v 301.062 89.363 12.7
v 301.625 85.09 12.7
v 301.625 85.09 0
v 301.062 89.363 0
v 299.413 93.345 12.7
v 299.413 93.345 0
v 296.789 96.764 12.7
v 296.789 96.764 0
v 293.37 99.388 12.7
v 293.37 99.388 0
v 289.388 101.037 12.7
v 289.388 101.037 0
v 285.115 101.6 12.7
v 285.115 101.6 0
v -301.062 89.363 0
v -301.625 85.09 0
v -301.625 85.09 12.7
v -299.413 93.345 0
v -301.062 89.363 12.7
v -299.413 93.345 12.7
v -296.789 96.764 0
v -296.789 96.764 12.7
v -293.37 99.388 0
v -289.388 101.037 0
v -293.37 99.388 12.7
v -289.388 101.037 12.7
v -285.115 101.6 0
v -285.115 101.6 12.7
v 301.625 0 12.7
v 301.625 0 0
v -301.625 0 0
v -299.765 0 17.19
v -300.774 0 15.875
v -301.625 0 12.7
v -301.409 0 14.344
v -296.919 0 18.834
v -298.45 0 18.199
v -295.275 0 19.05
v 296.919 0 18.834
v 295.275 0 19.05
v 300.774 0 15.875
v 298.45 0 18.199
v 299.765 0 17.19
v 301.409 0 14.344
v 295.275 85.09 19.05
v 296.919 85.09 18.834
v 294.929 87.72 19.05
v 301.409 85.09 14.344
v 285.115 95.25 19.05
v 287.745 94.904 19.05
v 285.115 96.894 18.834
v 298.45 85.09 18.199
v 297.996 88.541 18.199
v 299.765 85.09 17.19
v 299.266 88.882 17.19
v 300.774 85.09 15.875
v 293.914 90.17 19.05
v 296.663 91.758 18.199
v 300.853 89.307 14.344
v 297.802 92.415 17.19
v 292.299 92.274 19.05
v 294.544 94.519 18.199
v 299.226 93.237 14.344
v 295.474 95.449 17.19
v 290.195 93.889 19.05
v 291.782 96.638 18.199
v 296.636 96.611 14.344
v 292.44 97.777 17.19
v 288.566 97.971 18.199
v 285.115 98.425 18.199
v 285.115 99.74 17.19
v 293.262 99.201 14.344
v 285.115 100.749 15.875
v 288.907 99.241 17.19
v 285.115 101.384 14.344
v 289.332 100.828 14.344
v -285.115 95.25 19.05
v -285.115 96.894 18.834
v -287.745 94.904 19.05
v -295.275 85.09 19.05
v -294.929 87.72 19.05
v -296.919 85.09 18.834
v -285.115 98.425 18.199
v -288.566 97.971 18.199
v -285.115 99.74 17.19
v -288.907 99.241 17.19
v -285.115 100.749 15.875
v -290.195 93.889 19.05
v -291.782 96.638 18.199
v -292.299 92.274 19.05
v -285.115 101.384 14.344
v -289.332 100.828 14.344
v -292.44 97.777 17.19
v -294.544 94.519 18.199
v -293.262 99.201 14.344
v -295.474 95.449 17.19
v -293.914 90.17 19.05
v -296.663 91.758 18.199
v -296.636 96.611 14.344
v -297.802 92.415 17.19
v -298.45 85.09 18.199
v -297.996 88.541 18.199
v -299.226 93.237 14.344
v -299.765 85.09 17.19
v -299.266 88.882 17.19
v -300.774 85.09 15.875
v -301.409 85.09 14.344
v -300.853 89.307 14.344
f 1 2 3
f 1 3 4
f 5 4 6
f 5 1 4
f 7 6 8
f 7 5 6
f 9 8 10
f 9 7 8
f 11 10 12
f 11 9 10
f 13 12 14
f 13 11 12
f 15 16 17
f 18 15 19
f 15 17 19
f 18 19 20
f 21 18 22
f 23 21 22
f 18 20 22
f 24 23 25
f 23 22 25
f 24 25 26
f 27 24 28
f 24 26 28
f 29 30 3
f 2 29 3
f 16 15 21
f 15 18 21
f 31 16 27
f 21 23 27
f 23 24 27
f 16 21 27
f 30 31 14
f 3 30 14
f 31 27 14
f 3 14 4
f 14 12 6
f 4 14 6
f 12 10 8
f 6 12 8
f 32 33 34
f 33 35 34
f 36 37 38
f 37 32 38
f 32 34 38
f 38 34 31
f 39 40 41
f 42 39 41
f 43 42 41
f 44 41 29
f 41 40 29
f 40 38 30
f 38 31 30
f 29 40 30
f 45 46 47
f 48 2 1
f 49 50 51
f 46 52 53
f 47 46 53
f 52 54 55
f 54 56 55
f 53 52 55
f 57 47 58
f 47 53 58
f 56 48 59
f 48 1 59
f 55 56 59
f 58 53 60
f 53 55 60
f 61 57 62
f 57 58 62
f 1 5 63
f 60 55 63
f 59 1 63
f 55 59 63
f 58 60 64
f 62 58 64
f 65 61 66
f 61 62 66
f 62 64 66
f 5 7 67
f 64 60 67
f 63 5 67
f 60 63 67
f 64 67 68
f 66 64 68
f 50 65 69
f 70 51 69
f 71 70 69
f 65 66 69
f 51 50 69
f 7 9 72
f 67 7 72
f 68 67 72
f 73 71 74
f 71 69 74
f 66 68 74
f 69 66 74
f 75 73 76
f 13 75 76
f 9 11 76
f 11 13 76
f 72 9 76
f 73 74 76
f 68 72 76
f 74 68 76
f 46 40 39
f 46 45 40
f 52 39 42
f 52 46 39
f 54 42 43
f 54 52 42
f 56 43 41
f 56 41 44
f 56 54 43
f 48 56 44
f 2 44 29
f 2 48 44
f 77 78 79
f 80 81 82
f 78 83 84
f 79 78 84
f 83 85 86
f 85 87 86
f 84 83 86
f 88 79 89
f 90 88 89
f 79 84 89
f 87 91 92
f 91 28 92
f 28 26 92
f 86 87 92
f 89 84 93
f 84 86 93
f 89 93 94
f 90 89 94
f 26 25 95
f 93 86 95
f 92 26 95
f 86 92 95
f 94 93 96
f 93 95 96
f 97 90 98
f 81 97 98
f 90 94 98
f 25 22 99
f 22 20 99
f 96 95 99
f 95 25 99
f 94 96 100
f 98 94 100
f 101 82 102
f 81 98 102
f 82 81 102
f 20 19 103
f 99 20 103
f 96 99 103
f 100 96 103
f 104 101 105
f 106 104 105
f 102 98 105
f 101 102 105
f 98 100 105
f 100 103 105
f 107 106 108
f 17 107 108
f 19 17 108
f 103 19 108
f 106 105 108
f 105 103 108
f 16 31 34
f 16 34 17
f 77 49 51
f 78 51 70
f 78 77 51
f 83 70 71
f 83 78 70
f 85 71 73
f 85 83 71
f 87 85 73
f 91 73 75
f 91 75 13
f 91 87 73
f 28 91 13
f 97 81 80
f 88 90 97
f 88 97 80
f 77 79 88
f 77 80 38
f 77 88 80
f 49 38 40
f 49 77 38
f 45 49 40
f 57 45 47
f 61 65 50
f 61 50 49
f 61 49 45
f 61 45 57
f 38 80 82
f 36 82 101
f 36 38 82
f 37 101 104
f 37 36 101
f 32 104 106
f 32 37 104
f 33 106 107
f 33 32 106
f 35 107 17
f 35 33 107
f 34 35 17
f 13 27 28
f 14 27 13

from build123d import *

# Parameters (mm, degrees)
SKETCH1_W           = 603.25
SKETCH1_H           = 101.6
BOSS_EXTRUDE1_DEPTH = 19.05
FILLET1_R           = 16.51
FILLET2_R           = 6.35


with BuildPart() as part:
    # Sketch1 → Boss-Extrude1 (new body)
    with BuildSketch(Plane.XY):
        with Locations((0, 50.8)):
            Rectangle(SKETCH1_W, SKETCH1_H)
    extrude(amount=BOSS_EXTRUDE1_DEPTH)

    # Fillet1
    fillet1_edges = [part.edges().sort_by_distance(p)[0] for p in [
        (301.625, 101.6, 9.525),
        (-301.625, 101.6, 9.525),
    ]]
    fillet(fillet1_edges, radius=FILLET1_R)

    # Fillet2
    fillet2_edges = [part.edges().sort_by_distance(p)[0] for p in [
        (301.625, 42.545, 19.05),
        (-301.625, 42.545, 19.05),
        (0, 101.6, 19.05),
        (296.789332957, 96.764332957, 19.05),
        (-296.789332957, 96.764332957, 19.05),
    ]]
    fillet(fillet2_edges, radius=FILLET2_R)


solid = part.part
